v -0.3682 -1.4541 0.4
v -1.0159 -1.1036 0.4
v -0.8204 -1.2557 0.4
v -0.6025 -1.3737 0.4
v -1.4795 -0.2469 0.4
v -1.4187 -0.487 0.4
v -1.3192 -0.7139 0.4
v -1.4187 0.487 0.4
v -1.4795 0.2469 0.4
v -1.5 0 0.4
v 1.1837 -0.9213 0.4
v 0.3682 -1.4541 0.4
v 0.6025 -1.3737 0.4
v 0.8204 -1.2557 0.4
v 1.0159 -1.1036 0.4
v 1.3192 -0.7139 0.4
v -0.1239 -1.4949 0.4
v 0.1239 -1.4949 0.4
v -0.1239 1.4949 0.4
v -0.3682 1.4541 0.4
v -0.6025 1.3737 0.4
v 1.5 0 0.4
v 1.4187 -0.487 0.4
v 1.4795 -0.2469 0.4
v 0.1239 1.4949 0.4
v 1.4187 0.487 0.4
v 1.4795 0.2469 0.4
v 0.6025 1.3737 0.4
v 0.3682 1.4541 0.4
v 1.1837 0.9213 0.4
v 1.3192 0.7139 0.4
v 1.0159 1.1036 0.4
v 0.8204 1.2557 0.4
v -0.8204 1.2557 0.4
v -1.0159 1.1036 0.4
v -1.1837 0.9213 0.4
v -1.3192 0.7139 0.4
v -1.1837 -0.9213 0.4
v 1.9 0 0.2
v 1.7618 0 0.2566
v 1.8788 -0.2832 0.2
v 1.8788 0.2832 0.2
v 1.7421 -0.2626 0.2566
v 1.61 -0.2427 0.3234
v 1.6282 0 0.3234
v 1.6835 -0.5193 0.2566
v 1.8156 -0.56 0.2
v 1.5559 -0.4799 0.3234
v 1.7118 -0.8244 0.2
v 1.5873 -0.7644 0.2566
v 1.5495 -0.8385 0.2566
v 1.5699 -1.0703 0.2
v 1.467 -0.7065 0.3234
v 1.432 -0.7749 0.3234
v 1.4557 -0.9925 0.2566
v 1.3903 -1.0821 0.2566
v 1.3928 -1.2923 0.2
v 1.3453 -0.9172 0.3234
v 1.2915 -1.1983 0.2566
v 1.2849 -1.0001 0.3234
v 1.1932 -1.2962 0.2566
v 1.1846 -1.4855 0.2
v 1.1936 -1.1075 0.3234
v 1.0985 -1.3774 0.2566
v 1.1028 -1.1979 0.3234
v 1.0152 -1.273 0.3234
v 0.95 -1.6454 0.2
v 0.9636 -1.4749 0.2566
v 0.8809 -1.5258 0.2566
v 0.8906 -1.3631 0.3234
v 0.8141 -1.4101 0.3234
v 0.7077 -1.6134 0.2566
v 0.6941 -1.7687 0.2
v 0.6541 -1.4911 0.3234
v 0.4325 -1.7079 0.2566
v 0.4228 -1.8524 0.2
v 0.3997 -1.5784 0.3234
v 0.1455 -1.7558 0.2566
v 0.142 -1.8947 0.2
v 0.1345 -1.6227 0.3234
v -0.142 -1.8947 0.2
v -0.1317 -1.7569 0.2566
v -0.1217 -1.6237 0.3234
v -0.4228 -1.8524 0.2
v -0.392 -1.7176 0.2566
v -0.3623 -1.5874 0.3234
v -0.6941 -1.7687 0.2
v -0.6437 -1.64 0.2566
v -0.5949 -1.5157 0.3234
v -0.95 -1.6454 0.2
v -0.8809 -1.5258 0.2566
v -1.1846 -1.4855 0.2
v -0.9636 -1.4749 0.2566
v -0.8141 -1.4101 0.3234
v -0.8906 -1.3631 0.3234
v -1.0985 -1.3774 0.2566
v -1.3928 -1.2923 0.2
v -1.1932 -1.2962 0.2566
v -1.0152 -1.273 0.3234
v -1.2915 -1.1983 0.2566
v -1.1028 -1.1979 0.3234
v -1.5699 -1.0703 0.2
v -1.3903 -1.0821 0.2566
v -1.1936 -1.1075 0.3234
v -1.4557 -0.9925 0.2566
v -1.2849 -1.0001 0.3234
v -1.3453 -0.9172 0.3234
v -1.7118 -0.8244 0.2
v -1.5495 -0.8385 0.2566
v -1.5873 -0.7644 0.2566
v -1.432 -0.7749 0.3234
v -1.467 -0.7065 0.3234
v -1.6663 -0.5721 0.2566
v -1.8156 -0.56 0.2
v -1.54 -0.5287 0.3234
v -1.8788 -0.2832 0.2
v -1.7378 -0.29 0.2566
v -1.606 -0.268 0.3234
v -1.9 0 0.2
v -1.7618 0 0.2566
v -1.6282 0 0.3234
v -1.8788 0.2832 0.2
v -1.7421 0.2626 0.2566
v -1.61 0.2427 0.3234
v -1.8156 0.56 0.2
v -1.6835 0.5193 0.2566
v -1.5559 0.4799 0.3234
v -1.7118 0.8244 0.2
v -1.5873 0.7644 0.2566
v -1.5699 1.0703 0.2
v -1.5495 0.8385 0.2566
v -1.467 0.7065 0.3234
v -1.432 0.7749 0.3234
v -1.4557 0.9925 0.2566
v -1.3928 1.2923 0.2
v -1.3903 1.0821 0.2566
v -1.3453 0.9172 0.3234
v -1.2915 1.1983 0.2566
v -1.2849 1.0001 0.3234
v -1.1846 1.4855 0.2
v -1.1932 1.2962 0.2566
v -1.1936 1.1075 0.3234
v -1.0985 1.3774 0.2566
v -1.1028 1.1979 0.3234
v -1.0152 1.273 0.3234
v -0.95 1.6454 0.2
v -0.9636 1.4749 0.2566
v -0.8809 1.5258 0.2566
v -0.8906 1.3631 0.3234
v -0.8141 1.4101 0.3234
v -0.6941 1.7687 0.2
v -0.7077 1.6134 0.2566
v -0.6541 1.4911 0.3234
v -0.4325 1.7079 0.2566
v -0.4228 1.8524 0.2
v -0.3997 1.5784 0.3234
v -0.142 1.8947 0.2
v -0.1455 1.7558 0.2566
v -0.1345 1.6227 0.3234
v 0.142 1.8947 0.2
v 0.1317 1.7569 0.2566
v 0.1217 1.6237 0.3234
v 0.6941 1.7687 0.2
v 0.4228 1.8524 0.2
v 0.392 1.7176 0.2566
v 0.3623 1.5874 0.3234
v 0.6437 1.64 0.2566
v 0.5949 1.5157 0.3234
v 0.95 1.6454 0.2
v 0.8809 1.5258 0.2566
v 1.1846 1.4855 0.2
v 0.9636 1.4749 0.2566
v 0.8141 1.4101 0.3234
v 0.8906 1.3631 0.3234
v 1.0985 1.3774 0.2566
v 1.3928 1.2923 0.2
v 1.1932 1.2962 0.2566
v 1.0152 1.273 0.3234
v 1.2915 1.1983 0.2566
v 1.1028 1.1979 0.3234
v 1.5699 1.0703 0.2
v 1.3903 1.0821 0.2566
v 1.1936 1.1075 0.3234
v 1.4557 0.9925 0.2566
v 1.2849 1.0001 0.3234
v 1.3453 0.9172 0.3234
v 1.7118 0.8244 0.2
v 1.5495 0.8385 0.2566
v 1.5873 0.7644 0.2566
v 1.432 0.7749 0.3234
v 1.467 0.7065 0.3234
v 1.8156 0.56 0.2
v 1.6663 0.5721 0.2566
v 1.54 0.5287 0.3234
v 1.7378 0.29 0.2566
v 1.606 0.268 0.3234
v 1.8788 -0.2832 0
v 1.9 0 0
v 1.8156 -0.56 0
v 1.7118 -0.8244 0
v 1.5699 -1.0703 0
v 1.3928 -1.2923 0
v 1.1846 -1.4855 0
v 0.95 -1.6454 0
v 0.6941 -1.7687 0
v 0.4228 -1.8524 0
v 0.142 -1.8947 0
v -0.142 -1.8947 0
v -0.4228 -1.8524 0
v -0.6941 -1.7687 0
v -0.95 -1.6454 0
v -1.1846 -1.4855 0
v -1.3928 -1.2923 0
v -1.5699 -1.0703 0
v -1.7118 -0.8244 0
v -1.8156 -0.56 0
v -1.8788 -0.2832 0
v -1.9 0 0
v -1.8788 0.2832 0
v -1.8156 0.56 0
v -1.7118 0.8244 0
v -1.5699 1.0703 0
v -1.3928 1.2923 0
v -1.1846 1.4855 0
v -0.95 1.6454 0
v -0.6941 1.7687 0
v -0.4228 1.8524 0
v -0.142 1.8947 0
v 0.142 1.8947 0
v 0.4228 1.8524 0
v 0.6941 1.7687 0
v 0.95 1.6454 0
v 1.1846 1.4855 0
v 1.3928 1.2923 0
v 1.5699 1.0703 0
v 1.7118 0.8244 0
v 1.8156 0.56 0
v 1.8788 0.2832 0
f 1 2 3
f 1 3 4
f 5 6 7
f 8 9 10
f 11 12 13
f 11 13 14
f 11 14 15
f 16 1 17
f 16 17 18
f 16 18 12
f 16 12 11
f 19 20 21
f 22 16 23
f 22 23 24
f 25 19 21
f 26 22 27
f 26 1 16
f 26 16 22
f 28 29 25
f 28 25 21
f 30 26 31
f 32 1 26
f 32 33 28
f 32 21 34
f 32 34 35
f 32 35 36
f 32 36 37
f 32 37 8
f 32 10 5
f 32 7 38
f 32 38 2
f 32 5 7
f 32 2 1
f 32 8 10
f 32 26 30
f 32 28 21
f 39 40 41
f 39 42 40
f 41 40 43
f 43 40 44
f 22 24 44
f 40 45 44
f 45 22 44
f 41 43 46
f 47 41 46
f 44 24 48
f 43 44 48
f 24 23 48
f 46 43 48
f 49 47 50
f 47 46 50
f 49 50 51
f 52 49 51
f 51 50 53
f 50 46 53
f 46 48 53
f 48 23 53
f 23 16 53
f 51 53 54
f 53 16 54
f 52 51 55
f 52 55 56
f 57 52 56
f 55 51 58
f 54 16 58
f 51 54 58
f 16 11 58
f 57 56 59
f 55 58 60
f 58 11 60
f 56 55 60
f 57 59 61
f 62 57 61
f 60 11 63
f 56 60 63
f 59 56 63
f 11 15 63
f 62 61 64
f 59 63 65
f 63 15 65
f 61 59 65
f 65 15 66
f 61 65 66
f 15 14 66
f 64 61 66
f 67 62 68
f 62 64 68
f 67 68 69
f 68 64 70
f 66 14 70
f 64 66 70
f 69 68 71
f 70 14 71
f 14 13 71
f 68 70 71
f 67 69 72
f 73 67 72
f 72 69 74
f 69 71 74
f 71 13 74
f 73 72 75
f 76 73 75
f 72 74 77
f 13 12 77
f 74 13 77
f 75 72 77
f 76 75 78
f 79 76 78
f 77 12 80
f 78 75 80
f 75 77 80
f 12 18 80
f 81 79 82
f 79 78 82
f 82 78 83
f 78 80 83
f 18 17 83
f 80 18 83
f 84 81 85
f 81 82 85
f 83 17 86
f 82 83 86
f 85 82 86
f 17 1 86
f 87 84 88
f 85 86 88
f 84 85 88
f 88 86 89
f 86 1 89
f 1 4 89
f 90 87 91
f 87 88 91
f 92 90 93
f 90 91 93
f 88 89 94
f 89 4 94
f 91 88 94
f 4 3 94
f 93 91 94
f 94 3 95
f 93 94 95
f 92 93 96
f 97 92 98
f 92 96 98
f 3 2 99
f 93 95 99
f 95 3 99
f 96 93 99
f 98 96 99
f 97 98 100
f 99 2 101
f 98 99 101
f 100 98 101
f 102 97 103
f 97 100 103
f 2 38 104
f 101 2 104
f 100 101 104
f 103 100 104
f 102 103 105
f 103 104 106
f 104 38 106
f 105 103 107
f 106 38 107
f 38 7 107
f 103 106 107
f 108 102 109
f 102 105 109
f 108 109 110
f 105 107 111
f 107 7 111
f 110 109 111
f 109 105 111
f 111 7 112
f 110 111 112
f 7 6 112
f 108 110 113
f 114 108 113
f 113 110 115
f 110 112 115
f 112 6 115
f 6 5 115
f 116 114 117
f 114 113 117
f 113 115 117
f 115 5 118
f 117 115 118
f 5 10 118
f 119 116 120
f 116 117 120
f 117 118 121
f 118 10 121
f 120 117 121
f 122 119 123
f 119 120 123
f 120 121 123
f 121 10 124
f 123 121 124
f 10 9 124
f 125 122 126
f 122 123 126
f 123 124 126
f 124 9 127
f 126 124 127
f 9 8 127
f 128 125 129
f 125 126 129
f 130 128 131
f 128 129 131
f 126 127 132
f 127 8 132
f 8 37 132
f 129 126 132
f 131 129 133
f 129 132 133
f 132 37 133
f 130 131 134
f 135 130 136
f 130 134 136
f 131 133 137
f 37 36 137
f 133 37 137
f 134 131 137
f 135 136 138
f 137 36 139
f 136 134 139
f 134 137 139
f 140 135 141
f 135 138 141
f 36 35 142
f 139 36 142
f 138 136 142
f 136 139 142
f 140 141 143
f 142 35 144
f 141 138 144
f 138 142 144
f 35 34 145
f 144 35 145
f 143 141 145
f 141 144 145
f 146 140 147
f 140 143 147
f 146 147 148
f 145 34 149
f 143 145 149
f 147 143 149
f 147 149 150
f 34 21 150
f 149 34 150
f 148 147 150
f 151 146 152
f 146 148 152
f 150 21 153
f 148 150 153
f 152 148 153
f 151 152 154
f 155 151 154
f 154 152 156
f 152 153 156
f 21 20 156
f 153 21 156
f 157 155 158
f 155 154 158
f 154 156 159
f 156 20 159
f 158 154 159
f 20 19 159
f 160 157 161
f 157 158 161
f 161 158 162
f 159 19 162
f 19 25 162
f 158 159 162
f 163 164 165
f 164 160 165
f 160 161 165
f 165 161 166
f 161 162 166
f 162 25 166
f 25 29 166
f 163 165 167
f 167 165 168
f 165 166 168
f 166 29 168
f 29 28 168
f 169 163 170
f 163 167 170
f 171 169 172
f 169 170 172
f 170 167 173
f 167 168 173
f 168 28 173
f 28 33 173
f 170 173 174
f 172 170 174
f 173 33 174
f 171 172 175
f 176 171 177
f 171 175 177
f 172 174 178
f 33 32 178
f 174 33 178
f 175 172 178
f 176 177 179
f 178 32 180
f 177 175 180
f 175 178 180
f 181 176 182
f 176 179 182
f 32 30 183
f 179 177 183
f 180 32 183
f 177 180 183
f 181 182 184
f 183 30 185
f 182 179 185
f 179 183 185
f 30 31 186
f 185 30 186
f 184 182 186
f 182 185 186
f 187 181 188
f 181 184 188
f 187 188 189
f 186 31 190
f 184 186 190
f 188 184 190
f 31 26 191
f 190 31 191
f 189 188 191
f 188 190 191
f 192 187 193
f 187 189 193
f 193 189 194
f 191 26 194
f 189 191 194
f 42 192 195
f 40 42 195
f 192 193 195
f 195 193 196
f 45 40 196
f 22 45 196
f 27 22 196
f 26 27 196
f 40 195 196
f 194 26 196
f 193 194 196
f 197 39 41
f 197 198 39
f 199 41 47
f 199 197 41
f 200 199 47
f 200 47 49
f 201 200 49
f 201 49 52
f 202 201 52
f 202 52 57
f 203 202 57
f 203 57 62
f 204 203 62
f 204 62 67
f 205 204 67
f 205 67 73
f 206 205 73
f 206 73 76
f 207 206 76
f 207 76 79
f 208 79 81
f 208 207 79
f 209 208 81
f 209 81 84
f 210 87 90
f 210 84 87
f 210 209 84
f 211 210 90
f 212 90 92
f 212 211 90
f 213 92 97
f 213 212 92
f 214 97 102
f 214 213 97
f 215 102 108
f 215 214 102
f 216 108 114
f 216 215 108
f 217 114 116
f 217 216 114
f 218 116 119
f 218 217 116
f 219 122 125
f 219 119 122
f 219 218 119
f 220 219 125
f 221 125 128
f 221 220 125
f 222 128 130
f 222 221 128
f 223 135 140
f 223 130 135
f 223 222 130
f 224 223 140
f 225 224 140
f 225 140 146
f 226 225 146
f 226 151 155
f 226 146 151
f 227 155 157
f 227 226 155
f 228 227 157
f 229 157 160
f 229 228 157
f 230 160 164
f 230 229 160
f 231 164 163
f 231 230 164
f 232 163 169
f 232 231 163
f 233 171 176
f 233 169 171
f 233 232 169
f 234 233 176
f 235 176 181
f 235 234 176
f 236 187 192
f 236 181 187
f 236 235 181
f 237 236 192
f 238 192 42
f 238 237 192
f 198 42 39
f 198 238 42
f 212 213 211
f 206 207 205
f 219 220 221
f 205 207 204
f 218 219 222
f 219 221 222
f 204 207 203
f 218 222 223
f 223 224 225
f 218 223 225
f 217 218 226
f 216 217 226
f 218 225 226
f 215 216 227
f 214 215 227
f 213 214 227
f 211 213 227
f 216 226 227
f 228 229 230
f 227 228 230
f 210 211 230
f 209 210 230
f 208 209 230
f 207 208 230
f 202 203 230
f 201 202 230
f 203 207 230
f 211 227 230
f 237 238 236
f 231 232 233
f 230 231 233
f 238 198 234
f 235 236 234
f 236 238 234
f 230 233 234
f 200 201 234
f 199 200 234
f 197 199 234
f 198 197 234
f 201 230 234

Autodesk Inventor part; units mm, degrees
ref_plane "YZ Plane" through (0, 0, 0) normal (1, 0, 0) x (0, 1, 0)
ref_plane "XZ Plane" through (0, 0, 0) normal (0, 1, 0) x (-1, 0, 0)
ref_plane "XY Plane" through (0, 0, 0) normal (0, 0, 1) x (1, 0, 0)
sketch "Sketch1" plane through (0, 0, 0) normal (0, 0, 1) x (1, 0, 0)
  circle A0 centre (0, 0) radius 1.9
  dimension "d0" = 3.8
extrude "Extrusion1" add sketch "Sketch1" along normal blind 0.2
sketch "Sketch2" plane through (0, 0, 0.2) normal (0, 0, 1) x (1, 0, 0)
  circle A0 centre (0, 0) radius 1.5
  dimension "d3" = 3
extrude "Extrusion2" add sketch "Sketch2" along normal blind 0.2
fillet "Fillet1" radius 2 1 edges at (-1.5, 0, 0.2)
properties part number "frisbeeeeeeee" material "Aluminum, Anodized Red"
